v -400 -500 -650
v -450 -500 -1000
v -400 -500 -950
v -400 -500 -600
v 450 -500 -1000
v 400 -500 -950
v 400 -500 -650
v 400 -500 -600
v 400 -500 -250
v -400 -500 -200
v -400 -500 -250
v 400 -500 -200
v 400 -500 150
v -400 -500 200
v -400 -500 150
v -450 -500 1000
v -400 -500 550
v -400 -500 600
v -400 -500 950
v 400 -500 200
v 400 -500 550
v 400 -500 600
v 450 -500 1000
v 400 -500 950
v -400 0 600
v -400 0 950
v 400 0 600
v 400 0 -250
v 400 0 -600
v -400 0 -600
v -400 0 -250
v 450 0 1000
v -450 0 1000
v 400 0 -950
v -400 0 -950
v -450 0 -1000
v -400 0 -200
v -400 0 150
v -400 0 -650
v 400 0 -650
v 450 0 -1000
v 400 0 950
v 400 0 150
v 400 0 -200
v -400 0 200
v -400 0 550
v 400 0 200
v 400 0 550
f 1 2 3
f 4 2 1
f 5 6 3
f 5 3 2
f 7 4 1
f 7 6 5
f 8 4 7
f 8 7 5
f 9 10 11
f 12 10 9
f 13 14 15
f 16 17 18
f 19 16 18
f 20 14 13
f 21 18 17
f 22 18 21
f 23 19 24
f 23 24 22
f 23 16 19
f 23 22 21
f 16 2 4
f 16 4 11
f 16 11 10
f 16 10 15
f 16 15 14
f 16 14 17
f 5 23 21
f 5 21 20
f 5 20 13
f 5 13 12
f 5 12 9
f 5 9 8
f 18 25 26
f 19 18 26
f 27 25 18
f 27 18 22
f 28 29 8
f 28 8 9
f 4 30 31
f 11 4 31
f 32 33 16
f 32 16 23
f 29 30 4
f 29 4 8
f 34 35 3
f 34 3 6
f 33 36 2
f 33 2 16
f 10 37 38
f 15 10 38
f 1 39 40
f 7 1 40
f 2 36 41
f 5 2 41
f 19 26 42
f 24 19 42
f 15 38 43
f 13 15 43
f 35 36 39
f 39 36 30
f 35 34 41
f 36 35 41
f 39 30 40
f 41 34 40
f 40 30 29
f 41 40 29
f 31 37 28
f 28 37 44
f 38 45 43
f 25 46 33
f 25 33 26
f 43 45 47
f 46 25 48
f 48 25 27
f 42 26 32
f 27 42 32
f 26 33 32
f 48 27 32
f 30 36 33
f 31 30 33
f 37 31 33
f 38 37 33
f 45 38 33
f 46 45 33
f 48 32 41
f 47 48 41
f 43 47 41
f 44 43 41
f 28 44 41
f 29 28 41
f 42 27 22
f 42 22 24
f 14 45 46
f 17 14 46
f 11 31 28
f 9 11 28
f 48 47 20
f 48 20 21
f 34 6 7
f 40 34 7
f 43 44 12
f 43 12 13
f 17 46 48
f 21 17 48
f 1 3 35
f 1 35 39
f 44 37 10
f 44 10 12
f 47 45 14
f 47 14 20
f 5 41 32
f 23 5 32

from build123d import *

# Parameters (mm, degrees)
F0_W     = 900
F0_H     = 2000
F0_W_2   = 800
F0_H_2   = 300
F0_H_3   = 350
F1_DEPTH = 500


with BuildPart() as f1:
    # F0 (on Front) → F1 (new body)
    with BuildSketch(Plane.XZ):
        Rectangle(F0_W, F0_H)
        with Locations((0, -800)):
            Rectangle(F0_W_2, F0_H_2, mode=Mode.SUBTRACT)
        with Locations((0, -425)):
            Rectangle(F0_W_2, F0_H_3, mode=Mode.SUBTRACT)
        with Locations((0, -25)):
            Rectangle(F0_W_2, F0_H_3, mode=Mode.SUBTRACT)
        with Locations((0, 375)):
            Rectangle(F0_W_2, F0_H_3, mode=Mode.SUBTRACT)
        with Locations((0, 775)):
            Rectangle(F0_W_2, F0_H_3, mode=Mode.SUBTRACT)
    extrude(amount=F1_DEPTH)


solid = f1.part
